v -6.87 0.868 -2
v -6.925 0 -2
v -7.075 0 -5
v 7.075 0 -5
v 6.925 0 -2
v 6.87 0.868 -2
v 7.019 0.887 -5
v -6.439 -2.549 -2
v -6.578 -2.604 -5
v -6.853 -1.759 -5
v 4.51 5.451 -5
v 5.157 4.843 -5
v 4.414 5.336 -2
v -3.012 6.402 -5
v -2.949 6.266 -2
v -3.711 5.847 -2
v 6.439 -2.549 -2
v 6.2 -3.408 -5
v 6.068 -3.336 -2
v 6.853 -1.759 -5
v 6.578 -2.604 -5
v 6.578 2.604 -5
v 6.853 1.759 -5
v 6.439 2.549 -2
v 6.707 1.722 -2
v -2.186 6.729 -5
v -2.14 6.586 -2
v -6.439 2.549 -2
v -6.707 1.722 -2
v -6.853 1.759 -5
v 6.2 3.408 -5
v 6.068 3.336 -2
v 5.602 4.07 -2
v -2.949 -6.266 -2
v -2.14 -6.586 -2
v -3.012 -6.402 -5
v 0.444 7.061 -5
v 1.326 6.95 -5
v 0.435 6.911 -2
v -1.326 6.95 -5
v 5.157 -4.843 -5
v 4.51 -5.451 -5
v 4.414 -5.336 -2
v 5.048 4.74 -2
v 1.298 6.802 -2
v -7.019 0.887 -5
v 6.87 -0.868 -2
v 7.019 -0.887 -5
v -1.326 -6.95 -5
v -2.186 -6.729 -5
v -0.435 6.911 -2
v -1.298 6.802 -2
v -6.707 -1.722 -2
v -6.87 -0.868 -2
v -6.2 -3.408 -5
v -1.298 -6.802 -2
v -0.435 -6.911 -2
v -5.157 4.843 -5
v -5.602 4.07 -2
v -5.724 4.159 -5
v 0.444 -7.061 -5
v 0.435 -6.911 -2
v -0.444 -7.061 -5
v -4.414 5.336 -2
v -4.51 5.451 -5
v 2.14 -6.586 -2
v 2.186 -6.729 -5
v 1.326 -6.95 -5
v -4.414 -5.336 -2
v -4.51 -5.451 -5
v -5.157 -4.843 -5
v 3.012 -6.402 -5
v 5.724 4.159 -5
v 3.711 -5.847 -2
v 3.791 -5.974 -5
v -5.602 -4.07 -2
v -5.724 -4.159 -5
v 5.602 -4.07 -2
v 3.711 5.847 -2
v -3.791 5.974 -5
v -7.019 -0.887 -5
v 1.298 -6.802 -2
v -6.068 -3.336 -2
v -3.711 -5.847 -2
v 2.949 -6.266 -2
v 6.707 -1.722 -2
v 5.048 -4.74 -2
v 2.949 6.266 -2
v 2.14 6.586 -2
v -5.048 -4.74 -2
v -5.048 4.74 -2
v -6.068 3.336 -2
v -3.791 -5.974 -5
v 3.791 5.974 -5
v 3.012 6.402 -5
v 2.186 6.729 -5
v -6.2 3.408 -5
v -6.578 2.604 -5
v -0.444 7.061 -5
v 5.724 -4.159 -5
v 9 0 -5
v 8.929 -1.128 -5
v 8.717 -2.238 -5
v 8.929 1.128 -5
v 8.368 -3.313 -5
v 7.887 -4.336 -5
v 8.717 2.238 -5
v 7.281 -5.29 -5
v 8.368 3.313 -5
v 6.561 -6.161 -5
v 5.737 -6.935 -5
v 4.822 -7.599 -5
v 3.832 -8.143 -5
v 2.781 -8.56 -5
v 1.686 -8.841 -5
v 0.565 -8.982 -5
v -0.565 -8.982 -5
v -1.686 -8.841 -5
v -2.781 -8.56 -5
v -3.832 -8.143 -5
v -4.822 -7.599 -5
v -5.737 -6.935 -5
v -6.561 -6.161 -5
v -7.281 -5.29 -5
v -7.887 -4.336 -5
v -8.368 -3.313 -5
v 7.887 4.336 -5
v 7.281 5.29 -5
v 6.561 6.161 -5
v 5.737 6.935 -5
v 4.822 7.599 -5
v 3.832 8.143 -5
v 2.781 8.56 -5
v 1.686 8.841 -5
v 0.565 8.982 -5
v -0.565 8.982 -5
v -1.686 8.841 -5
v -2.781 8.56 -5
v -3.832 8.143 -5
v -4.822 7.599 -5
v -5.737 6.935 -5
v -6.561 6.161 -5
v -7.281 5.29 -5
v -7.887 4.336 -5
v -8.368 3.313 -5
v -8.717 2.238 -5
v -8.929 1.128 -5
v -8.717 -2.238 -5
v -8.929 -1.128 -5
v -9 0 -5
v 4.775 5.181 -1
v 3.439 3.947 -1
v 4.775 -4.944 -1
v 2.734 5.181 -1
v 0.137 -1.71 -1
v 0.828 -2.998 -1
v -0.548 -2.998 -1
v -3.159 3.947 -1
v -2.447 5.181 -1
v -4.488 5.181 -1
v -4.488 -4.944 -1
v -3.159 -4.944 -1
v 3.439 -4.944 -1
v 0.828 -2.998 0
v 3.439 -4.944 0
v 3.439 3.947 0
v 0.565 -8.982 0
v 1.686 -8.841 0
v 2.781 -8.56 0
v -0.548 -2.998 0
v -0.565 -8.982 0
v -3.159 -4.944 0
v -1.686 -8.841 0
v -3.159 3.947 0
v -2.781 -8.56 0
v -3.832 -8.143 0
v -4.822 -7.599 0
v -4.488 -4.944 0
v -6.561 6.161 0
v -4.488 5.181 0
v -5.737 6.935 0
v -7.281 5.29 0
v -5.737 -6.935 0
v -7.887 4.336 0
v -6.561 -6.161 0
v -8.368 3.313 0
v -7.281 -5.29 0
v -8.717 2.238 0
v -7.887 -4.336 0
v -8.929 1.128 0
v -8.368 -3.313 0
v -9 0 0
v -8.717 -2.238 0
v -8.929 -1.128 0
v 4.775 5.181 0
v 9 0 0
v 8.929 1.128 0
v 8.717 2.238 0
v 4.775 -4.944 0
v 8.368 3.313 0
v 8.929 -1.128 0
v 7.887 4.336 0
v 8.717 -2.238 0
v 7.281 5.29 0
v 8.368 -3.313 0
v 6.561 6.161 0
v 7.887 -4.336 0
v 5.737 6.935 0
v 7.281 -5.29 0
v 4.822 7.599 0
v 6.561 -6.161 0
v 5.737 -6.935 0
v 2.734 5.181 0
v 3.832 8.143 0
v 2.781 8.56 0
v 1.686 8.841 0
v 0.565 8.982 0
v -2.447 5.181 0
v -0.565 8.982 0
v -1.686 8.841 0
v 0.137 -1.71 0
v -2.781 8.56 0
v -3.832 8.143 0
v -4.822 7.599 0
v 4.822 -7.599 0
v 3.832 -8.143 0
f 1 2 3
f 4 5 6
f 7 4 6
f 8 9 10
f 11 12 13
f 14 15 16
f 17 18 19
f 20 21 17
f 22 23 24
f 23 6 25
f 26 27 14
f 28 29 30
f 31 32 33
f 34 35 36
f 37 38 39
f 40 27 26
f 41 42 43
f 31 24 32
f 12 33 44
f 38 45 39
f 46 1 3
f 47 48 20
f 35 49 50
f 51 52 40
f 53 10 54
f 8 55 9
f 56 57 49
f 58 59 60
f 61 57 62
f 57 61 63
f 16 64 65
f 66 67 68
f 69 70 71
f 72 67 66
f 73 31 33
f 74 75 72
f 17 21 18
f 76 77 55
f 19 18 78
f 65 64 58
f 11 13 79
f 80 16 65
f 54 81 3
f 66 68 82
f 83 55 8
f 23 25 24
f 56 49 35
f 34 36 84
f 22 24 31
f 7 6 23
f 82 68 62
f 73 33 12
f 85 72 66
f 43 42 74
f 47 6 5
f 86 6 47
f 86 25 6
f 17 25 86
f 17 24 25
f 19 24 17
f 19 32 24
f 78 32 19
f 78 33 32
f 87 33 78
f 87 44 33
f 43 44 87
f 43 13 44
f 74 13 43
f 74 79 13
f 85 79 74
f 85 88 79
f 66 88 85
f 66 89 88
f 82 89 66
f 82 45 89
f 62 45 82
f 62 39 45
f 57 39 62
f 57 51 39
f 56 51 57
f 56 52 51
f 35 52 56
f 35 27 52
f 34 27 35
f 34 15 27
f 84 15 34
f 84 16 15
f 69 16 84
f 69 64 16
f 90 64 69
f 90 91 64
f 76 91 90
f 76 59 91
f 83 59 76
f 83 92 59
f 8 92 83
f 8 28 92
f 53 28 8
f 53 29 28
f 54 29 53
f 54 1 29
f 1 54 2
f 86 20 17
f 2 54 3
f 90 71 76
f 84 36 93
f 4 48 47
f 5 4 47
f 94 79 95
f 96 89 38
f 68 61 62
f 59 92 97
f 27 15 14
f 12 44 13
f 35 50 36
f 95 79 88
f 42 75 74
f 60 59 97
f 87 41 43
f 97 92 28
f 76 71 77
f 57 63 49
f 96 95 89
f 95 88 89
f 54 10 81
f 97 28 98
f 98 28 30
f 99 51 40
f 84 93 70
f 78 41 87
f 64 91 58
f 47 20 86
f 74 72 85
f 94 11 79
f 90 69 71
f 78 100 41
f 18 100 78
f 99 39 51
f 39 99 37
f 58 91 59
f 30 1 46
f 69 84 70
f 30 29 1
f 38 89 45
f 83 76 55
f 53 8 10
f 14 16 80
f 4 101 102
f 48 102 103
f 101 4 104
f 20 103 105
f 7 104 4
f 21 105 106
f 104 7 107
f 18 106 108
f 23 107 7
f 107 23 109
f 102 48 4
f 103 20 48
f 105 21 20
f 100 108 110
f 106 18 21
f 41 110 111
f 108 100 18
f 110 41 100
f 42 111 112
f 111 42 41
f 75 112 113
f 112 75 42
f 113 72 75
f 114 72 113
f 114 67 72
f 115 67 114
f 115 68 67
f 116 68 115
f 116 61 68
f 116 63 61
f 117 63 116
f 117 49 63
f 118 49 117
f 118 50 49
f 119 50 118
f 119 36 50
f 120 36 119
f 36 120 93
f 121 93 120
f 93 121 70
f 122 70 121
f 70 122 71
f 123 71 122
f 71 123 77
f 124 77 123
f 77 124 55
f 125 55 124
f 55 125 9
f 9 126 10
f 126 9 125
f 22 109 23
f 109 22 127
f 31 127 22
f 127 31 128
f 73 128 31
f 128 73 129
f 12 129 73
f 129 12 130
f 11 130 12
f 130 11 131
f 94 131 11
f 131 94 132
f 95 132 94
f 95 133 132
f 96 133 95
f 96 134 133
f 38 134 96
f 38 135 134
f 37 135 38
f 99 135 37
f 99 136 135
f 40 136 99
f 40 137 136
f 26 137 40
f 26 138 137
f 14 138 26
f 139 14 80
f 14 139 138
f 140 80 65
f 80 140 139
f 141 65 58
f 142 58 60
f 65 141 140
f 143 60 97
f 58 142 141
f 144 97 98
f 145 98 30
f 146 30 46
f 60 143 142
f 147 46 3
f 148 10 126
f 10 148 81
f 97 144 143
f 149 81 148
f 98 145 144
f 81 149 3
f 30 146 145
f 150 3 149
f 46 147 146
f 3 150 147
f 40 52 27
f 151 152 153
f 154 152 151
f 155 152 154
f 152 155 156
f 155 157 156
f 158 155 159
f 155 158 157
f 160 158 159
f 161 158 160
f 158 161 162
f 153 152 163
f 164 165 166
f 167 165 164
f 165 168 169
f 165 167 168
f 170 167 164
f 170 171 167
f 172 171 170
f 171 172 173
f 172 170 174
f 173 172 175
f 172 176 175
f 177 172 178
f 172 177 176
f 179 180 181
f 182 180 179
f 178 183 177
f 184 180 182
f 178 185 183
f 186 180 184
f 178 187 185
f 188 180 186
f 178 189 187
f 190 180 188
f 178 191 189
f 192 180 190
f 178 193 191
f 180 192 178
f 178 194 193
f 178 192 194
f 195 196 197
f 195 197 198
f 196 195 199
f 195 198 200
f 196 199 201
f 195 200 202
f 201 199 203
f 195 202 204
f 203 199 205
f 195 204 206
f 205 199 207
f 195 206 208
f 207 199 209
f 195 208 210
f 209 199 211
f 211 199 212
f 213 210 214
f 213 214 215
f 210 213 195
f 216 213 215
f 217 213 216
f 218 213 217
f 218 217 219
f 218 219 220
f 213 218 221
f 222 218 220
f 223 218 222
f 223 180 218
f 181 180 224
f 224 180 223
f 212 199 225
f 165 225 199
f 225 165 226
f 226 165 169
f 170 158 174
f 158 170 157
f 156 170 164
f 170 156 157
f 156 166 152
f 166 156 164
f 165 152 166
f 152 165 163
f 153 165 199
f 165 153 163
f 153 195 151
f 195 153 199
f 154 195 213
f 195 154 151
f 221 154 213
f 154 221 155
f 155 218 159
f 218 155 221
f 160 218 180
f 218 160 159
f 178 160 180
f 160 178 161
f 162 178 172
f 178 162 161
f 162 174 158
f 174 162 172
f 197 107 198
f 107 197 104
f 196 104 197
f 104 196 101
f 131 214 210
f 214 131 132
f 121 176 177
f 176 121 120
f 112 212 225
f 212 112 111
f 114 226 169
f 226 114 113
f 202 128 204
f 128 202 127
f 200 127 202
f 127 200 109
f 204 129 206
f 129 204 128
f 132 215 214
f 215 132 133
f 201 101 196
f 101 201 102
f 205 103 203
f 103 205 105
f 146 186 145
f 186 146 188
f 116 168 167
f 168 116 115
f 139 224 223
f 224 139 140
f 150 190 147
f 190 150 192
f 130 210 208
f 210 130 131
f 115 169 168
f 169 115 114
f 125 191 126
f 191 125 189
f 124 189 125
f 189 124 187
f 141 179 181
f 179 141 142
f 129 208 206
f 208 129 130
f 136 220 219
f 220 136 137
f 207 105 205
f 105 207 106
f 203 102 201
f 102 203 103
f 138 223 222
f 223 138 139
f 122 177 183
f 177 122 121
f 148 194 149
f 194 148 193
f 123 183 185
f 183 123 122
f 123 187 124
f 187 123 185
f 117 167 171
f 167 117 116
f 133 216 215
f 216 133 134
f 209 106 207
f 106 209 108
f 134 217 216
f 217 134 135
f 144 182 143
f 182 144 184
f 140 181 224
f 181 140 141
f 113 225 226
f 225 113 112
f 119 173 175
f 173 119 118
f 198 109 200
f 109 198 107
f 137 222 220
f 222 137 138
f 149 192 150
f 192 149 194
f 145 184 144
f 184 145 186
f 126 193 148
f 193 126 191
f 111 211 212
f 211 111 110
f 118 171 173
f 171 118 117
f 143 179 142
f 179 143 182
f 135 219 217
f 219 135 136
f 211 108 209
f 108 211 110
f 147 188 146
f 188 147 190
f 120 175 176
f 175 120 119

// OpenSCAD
$fn = 50;


difference() {
	union() {
		translate(v = [0, 0, -5.0000000000]) {
			cylinder(h = 5, r = 9.0000000000);
		}
	}
	union() {
		#translate(v = [0, 0, -5.0000000000]) {
			cylinder(h = 3, r1 = 7.0750000000, r2 = 6.9250000000);
		}
		translate(v = [0, 0, -1]) {
			linear_extrude(height = 1) {
				text(font = "Impact", halign = "center", size = 10, text = "M", valign = "center");
			}
		}
	}
}
